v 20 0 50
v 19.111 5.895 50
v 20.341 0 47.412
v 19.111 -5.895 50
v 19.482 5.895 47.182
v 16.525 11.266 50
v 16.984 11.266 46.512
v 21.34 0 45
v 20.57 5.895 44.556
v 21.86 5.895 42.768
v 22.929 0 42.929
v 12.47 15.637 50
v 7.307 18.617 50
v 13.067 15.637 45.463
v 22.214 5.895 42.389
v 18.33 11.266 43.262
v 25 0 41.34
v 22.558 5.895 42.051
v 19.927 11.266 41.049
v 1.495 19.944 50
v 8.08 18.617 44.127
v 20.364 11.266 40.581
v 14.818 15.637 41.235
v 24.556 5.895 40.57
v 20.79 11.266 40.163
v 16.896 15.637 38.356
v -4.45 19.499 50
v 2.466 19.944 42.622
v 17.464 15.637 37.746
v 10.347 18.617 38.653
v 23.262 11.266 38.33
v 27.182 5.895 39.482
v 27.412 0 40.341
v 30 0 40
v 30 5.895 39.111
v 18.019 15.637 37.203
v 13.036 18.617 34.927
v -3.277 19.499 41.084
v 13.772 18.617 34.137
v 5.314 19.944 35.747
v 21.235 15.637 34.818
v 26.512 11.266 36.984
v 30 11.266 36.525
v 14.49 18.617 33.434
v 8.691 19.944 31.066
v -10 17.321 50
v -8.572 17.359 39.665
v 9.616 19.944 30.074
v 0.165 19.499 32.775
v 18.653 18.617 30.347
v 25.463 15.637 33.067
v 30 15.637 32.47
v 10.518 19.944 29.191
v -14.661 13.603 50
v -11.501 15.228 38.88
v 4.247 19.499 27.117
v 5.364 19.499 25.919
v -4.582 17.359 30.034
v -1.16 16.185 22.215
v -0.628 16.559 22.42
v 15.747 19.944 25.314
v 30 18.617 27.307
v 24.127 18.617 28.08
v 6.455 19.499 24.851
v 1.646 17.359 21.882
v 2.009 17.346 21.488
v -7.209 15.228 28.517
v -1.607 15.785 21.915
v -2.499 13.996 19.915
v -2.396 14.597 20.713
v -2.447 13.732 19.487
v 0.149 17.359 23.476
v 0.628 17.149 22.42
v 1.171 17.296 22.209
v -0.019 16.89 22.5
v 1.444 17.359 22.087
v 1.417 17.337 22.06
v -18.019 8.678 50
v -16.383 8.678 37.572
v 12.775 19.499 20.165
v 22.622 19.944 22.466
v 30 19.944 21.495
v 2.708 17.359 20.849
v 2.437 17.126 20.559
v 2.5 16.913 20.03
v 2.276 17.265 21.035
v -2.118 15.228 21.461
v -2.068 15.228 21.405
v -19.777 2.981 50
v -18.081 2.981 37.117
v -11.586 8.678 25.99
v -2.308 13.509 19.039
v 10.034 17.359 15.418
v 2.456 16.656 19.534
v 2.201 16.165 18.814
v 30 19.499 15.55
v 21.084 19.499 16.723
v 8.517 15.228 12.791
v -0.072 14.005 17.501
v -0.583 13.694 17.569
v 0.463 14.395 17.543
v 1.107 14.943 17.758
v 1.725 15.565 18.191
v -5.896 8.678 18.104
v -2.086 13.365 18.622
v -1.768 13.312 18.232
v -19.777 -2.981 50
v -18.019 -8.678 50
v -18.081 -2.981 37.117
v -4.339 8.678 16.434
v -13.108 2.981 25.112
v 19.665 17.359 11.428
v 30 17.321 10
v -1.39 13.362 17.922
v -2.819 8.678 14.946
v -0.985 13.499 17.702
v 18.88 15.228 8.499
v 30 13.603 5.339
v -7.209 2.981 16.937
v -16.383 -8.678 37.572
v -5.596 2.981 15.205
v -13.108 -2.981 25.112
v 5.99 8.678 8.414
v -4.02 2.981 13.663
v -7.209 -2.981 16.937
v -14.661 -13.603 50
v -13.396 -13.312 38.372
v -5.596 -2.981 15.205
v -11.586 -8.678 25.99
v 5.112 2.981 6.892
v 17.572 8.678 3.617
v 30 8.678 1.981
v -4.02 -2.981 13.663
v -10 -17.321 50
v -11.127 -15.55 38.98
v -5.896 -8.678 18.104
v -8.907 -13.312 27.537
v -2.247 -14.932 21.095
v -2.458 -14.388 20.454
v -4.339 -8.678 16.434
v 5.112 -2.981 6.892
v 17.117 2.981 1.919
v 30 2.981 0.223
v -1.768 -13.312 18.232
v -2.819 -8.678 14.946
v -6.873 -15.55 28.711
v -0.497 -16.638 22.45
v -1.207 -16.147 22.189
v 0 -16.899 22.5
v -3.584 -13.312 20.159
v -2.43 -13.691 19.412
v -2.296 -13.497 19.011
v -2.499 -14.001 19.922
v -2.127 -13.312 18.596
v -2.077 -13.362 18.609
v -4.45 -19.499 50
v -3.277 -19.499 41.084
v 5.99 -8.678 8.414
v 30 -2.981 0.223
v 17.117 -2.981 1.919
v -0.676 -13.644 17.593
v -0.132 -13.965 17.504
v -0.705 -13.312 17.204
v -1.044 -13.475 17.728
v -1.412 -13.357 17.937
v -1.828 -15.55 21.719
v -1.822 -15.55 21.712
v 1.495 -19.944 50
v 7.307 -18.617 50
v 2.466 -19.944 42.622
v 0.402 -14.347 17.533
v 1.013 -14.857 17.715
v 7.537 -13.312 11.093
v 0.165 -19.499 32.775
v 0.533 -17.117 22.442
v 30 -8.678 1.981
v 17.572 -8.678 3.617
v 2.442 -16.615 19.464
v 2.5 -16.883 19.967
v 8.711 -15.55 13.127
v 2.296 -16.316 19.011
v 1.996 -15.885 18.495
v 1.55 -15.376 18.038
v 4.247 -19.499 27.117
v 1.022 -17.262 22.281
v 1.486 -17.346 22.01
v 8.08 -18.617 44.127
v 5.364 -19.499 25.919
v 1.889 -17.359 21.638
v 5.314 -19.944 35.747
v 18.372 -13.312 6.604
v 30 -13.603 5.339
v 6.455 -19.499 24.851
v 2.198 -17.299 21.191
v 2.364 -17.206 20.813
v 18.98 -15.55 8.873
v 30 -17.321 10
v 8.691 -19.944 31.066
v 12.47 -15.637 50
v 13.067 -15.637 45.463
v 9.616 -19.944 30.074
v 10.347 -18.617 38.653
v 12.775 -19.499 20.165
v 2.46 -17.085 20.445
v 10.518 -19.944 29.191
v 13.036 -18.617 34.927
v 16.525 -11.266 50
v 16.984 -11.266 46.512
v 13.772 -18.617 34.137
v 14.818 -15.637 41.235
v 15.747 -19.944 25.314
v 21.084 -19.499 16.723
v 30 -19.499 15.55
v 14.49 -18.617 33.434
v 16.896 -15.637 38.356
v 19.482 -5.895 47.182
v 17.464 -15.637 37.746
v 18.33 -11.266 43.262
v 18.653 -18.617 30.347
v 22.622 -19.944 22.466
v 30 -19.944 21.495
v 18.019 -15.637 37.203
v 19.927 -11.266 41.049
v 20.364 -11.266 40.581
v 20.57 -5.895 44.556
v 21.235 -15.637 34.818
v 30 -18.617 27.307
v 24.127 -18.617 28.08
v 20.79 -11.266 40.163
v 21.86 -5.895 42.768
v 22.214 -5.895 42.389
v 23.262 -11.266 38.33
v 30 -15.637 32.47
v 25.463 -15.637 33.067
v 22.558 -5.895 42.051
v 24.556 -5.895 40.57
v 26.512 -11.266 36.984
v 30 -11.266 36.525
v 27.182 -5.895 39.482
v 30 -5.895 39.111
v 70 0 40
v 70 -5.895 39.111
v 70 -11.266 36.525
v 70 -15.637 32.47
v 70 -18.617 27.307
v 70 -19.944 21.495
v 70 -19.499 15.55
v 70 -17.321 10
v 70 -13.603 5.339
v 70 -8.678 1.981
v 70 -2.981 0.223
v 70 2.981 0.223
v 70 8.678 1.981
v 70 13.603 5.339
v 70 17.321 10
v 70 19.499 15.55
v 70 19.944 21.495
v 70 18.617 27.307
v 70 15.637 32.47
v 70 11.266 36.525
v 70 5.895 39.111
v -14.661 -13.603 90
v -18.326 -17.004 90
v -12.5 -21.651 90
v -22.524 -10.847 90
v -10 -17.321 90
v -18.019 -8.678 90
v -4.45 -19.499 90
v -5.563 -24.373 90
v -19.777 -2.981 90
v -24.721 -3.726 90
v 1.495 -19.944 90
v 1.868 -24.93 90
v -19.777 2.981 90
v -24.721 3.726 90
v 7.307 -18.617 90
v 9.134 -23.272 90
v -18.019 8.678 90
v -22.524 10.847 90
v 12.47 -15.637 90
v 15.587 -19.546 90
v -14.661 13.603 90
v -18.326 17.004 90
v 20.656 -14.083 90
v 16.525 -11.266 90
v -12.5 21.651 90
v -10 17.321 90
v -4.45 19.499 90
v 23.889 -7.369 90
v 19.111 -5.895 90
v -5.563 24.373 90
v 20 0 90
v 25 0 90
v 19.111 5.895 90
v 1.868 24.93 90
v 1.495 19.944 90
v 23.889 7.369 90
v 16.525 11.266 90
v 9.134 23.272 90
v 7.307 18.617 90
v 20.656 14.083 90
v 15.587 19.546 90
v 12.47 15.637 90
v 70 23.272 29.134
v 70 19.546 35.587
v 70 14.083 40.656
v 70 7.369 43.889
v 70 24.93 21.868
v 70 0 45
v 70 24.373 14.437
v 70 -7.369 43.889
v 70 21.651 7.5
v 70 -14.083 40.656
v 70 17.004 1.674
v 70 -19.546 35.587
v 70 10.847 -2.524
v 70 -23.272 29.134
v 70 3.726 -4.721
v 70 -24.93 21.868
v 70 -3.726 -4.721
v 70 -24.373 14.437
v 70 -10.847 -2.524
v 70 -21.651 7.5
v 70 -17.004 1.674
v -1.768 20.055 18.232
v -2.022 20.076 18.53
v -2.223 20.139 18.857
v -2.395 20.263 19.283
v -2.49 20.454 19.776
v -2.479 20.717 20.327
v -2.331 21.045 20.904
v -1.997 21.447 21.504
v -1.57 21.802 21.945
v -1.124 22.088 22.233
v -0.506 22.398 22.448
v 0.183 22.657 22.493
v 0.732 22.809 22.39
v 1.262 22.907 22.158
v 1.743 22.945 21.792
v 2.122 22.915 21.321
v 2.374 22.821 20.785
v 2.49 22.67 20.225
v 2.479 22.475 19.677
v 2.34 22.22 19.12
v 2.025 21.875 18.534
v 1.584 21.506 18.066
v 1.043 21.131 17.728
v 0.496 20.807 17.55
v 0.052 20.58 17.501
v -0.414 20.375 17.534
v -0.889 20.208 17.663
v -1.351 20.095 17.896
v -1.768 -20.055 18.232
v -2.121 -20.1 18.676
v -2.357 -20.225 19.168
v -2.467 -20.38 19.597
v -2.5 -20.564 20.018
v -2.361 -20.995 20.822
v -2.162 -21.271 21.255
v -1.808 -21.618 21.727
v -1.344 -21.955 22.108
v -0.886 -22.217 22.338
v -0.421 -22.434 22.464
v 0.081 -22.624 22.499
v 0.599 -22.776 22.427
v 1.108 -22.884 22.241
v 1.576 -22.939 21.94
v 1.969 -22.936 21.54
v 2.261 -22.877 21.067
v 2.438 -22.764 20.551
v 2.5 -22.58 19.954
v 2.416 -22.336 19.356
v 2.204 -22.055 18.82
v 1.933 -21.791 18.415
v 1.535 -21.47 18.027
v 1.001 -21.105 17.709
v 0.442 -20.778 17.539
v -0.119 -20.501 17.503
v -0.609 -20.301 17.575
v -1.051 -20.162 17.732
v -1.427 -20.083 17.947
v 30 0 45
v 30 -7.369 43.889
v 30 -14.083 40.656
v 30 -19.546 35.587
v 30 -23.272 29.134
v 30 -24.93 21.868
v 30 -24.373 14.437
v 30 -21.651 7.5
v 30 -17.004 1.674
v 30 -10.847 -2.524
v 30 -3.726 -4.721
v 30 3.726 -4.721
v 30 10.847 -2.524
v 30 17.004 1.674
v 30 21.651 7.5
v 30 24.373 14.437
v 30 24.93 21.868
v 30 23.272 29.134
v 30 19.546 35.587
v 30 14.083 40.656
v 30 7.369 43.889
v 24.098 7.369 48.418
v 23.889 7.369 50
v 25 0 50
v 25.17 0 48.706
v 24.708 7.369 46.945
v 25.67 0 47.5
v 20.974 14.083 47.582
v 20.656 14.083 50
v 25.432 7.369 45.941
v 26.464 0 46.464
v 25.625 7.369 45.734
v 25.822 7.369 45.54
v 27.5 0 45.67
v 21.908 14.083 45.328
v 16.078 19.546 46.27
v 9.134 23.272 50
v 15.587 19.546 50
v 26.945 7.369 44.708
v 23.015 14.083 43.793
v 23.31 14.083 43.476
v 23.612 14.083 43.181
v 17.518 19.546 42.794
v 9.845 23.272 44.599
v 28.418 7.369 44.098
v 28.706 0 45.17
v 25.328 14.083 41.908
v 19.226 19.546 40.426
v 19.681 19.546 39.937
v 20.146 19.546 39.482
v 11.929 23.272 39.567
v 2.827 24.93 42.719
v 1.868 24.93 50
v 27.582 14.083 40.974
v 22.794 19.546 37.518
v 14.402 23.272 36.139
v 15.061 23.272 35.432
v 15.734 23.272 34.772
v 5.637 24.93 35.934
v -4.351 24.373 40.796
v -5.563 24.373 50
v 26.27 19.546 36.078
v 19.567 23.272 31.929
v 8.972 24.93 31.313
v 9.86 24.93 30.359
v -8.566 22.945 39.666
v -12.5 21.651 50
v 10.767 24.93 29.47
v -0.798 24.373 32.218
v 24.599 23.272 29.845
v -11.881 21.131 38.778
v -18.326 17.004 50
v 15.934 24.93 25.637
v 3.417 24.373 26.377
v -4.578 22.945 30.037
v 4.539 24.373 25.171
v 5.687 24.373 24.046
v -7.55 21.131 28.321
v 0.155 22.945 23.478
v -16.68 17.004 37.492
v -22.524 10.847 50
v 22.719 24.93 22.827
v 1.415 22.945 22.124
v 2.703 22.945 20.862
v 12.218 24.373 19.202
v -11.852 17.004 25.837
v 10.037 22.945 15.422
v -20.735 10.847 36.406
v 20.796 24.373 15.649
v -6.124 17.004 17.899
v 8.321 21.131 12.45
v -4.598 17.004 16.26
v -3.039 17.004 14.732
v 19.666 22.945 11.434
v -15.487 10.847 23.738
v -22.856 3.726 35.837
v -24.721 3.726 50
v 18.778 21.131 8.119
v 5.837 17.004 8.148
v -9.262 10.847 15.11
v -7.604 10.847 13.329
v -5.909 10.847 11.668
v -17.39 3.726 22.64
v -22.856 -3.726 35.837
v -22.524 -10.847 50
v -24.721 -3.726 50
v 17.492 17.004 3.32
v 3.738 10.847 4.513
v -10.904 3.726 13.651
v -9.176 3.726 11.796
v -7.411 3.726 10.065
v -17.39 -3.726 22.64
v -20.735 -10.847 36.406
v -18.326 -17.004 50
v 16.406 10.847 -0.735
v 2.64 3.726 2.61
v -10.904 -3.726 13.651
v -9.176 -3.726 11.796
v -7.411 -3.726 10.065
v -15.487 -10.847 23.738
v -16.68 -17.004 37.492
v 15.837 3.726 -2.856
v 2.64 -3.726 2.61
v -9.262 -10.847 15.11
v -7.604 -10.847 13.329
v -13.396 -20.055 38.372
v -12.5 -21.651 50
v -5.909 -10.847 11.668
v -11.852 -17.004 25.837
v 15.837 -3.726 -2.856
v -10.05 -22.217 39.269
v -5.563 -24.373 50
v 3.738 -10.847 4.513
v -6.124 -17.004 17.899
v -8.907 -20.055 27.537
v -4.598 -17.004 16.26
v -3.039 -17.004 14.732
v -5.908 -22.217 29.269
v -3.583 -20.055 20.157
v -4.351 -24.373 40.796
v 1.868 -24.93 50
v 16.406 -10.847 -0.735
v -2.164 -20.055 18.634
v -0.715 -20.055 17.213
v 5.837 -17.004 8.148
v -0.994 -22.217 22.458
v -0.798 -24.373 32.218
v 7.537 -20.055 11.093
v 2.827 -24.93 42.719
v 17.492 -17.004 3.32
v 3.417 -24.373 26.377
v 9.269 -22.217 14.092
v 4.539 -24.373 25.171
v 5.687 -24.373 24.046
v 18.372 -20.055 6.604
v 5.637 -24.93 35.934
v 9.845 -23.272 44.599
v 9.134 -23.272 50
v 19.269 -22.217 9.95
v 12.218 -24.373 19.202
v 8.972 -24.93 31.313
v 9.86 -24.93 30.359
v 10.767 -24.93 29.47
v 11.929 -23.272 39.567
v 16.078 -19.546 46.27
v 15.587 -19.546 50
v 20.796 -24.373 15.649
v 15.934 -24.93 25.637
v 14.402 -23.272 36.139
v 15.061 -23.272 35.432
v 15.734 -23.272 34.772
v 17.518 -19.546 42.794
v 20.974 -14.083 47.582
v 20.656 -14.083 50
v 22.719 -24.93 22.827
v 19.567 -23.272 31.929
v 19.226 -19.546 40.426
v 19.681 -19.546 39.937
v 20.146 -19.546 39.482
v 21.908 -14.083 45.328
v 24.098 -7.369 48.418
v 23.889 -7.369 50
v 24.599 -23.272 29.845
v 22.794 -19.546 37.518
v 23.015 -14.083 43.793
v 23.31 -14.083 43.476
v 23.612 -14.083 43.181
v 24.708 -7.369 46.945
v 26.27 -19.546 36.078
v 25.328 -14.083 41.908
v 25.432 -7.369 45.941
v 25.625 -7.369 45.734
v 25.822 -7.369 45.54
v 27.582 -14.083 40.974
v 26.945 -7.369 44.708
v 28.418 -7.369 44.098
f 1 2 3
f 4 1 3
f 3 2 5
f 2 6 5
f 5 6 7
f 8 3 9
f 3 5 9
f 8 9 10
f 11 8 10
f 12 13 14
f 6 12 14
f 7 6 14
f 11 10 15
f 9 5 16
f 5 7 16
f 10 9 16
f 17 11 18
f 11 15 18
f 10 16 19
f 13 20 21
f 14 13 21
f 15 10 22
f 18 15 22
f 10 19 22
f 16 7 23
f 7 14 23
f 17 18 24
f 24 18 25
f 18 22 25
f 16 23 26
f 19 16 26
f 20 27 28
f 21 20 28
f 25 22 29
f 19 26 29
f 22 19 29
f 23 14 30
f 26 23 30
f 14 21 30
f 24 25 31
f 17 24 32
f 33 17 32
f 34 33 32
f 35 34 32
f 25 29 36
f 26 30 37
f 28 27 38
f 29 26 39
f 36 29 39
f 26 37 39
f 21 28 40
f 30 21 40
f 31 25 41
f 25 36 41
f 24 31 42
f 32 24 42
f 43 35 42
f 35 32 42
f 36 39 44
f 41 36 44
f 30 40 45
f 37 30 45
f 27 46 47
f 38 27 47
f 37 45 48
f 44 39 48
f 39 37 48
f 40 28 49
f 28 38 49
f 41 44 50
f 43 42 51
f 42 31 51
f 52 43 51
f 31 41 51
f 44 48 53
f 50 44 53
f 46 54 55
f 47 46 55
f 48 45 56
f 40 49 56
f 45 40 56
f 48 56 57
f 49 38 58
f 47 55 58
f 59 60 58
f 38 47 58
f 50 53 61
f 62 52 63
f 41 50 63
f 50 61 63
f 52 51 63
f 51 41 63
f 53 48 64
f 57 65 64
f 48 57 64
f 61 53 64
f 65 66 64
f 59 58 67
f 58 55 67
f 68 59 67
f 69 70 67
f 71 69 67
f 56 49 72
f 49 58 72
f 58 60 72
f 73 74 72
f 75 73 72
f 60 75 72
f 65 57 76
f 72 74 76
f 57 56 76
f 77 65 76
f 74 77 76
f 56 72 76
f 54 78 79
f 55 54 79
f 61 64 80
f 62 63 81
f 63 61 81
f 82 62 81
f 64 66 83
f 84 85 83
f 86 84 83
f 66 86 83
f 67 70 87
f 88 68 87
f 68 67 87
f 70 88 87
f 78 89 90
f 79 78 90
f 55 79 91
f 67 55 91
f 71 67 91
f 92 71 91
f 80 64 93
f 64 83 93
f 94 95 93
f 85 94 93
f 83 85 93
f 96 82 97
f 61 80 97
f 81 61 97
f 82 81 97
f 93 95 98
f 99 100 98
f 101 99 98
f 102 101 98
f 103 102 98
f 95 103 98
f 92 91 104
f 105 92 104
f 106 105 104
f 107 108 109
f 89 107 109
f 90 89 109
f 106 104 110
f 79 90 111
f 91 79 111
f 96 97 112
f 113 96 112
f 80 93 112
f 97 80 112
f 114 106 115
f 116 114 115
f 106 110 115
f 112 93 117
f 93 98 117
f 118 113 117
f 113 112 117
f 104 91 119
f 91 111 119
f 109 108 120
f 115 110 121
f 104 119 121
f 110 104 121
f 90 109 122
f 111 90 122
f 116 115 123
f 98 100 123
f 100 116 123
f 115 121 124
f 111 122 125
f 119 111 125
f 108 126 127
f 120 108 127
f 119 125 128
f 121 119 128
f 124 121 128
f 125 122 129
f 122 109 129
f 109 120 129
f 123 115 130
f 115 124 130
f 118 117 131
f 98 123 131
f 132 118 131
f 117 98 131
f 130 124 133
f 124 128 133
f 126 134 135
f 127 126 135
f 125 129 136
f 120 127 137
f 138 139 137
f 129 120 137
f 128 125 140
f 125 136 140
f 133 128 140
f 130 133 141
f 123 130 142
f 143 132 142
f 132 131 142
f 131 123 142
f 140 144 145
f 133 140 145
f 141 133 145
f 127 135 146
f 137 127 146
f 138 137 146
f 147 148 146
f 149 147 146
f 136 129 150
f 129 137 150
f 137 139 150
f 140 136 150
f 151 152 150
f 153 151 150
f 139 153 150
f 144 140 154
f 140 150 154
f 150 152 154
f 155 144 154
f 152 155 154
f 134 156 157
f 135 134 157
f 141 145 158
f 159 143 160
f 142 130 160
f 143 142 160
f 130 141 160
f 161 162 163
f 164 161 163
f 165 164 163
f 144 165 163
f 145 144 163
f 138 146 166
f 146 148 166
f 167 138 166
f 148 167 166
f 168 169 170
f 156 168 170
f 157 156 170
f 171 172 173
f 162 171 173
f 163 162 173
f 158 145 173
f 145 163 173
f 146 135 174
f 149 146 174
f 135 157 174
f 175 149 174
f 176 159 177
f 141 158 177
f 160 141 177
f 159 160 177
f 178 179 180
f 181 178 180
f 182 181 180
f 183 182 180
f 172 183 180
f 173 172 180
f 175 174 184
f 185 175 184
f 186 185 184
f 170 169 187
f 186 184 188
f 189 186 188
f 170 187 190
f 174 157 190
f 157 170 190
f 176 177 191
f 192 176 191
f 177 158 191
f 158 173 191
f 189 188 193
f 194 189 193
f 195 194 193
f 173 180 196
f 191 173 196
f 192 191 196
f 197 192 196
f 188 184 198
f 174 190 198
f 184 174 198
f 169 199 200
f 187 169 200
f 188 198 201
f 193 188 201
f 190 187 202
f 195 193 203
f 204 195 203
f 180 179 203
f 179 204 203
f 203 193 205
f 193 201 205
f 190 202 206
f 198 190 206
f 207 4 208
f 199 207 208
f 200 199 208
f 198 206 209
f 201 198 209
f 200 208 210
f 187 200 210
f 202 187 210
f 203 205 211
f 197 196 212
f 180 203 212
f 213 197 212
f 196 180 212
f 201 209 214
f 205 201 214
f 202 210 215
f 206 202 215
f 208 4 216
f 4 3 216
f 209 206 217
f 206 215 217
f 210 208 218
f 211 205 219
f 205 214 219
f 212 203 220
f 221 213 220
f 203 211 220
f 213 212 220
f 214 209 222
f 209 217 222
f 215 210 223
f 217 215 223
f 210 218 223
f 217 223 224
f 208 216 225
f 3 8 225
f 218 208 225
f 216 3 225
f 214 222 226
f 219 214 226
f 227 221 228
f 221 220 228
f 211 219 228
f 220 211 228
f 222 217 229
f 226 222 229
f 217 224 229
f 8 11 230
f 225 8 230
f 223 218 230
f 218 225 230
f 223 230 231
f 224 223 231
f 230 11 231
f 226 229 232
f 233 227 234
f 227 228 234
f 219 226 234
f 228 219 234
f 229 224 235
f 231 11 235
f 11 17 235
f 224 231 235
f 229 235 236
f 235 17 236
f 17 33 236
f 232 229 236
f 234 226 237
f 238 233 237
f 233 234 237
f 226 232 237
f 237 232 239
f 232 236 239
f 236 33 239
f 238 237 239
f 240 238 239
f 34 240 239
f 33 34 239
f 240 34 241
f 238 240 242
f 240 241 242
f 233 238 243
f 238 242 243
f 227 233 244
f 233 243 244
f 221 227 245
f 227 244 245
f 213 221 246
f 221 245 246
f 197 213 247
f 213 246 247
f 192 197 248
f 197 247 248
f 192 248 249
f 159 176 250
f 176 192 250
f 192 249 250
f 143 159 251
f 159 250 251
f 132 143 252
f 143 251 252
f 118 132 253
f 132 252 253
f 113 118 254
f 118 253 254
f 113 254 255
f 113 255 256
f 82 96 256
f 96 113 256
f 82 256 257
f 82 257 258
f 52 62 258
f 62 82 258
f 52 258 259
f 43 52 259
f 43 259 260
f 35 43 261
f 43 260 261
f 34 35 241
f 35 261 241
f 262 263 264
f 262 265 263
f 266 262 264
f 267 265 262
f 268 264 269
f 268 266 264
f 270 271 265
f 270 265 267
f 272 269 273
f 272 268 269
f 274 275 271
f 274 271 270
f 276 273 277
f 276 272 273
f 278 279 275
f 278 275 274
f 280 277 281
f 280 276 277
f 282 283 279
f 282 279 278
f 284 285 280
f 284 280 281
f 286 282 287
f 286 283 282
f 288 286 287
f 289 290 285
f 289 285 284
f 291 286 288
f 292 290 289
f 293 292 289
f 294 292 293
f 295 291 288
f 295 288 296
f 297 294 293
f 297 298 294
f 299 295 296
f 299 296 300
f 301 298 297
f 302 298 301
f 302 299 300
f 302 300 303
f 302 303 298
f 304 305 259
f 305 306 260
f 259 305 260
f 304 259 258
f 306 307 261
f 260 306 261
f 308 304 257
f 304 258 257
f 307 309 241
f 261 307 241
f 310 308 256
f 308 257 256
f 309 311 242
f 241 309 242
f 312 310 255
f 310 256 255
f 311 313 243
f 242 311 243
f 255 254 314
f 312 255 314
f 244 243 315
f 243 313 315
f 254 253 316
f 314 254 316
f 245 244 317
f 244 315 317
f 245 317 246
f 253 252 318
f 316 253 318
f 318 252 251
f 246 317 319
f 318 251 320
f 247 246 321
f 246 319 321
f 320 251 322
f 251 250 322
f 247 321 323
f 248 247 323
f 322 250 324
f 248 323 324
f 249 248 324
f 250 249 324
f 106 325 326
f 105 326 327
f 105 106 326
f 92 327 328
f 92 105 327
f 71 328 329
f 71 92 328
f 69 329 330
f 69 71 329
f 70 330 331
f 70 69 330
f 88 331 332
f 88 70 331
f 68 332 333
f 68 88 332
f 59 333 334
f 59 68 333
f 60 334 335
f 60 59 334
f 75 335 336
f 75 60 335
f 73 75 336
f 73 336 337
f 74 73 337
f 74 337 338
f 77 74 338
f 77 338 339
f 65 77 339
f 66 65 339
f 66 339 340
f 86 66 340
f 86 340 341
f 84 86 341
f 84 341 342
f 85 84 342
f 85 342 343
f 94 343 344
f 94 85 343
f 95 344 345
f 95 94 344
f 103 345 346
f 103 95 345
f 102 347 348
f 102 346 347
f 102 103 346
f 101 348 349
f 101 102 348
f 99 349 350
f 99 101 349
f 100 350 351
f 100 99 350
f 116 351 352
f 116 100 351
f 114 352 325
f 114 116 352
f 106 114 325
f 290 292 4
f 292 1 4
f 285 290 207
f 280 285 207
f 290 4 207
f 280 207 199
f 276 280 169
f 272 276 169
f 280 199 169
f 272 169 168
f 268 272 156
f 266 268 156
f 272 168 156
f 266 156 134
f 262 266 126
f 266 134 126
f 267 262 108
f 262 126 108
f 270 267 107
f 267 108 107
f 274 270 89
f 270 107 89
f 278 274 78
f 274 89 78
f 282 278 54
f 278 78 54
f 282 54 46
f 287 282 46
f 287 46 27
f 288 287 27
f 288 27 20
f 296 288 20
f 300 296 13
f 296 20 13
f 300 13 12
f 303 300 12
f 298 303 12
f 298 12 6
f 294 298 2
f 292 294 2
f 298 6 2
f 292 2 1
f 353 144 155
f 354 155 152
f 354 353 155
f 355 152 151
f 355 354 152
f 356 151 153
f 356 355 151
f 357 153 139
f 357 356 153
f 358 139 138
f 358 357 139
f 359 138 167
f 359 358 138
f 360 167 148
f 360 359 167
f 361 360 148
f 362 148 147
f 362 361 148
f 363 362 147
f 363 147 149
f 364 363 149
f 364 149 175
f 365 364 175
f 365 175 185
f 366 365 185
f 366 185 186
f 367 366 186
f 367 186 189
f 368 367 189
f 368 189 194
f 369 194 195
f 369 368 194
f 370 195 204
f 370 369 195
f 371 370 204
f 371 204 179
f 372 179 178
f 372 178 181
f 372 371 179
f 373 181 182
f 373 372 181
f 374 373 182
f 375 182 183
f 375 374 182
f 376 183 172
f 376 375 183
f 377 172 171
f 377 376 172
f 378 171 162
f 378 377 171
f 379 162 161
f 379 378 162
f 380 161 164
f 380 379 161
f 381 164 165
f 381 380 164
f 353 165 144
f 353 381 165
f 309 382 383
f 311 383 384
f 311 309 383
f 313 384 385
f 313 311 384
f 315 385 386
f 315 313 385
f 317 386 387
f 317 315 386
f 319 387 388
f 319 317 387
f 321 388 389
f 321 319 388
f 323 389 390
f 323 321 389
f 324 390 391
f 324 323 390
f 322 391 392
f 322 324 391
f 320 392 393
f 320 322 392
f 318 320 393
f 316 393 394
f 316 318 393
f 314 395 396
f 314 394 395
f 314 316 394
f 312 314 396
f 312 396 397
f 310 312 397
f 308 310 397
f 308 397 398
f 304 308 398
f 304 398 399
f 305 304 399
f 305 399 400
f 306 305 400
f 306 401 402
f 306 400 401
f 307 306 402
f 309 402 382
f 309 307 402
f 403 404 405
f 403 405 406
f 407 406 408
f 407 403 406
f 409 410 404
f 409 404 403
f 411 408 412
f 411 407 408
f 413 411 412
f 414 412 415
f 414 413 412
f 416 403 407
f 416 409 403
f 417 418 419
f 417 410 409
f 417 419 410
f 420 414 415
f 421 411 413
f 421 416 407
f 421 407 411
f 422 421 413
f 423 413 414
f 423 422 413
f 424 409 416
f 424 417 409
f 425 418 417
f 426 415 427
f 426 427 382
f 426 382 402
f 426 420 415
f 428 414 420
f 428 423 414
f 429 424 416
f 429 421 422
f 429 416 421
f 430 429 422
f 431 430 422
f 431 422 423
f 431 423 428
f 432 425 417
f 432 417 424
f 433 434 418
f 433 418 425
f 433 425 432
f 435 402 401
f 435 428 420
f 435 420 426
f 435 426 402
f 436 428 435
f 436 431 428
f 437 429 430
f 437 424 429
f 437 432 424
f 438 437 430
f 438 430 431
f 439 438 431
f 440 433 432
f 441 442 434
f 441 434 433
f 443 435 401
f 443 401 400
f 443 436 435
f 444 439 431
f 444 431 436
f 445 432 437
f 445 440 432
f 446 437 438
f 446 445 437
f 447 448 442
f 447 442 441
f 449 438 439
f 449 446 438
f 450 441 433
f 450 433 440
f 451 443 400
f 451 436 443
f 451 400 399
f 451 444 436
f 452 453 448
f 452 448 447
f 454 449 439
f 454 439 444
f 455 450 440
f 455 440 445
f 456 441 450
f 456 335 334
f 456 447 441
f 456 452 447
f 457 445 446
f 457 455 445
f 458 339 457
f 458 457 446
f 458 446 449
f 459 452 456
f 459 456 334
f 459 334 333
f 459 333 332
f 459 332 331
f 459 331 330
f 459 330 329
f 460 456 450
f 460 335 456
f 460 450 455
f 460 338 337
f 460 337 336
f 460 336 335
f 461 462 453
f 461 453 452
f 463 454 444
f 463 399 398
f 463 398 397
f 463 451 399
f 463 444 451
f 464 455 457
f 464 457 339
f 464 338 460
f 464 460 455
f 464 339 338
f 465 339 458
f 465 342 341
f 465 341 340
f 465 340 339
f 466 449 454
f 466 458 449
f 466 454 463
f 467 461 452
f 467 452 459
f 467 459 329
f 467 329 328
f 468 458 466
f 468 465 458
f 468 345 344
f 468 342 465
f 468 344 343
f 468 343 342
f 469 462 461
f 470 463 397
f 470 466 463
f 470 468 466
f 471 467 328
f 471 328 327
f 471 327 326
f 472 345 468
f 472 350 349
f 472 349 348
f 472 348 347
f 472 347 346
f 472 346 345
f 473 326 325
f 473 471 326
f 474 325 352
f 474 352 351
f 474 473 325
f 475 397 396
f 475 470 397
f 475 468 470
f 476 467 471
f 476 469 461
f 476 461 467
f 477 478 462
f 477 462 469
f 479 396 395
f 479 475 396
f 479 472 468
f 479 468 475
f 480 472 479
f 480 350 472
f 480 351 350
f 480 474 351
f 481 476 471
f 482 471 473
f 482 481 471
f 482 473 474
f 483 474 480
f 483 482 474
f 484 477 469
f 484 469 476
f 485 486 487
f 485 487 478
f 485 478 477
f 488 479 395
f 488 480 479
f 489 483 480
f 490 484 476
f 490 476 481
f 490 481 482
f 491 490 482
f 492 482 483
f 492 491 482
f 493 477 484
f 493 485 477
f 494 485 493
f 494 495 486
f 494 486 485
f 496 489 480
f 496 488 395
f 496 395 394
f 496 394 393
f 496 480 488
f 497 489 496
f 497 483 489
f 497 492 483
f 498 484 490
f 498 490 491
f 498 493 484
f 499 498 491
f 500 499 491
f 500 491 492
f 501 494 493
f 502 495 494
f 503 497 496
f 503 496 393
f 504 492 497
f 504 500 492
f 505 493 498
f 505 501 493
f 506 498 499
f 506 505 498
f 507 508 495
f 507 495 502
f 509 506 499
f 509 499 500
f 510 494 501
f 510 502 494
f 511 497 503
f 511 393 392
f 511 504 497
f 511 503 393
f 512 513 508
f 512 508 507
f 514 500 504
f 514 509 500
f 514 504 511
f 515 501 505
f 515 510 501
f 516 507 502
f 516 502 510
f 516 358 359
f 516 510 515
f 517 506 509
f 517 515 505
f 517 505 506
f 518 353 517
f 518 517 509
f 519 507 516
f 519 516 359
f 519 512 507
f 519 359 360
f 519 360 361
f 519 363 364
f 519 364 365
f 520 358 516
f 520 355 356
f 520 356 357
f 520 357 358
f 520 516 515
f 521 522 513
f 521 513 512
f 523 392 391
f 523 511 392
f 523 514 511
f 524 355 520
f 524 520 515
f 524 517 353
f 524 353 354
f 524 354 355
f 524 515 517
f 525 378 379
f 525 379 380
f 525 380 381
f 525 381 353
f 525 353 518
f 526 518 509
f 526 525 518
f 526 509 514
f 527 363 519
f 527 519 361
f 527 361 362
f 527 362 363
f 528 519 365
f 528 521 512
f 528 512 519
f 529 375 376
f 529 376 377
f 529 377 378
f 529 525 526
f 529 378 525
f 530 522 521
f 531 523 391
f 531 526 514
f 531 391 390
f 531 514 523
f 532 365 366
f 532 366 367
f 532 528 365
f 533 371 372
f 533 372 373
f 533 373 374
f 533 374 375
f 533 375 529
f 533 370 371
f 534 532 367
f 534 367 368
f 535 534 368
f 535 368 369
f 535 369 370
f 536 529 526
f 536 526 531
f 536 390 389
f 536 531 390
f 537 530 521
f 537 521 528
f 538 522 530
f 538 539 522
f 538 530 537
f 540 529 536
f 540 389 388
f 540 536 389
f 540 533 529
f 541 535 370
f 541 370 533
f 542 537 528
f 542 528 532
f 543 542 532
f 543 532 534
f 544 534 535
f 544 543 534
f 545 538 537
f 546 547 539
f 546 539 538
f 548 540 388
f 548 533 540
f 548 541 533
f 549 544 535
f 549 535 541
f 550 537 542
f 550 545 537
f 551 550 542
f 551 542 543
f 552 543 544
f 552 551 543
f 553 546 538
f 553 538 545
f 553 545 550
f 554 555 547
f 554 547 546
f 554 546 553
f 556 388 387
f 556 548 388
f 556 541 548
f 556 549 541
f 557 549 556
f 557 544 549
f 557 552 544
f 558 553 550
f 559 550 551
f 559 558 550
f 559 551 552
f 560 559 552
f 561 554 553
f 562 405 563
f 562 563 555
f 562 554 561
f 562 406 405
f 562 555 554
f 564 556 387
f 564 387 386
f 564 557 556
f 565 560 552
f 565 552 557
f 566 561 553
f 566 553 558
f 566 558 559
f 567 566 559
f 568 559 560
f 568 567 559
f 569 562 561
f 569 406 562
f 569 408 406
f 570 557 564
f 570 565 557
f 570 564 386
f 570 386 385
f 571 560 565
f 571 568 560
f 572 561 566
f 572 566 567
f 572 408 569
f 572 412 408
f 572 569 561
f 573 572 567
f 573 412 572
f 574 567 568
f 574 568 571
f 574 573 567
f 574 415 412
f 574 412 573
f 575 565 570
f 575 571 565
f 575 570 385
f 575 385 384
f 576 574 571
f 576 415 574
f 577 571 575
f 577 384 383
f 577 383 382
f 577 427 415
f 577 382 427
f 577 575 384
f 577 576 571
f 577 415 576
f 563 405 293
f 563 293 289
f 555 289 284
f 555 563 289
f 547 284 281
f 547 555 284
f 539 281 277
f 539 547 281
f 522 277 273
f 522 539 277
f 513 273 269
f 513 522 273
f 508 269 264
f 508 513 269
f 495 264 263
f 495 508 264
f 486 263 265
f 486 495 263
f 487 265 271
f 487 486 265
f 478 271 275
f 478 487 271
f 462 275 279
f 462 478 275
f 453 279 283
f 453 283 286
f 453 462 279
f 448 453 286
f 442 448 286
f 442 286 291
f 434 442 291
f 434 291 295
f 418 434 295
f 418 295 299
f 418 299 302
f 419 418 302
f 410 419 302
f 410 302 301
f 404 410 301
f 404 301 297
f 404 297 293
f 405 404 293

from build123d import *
from build123d.topology import SkipClean

# Parameters (mm, degrees)
SKETCH2_R               = 25
SHELL3_T                = -5
CUT_EXTRUDE2_DEPTH      = 117.726175321
CUT_EXTRUDE2_DEPTH_BACK = 96
SKETCH3_R               = 2.5


with BuildPart() as part:
    # Sweep7: sweep along a path in Sketch1
    with BuildLine(Plane(origin=(0, 0, 0), x_dir=(1, 0, 0), z_dir=(0, 1, 0))) as sweep7_path:
        Line((0, -90), (0, -50))
        ThreePointArc((0, -50), (8.786796564, -28.786796564), (30, -20))
        Line((30, -20), (70, -20))
    # Sketch2 → Sweep7 (sweep)
    with BuildSketch(Plane.XY.offset(90)):
        Circle(SKETCH2_R)
    sweep(path=sweep7_path.line)

    # Shell3
    shell3_openings = [part.faces().sort_by_distance(p)[0] for p in [
        (70, 0, 20),
        (0, 0, 90),
    ]]
    offset(amount=SHELL3_T, openings=shell3_openings, kind=Kind.INTERSECTION)

    # Sketch3 → Cut-Extrude2 (cut, two sides: drawn at the far end of the back side and taken through both)
    with SkipClean():  # the faces are left unmerged after this step: merging them gives an invalid solid
        with BuildSketch(Plane(origin=(0, 0, 0), x_dir=(1, 0, 0), z_dir=(0, 1, 0)).offset(-CUT_EXTRUDE2_DEPTH_BACK)):
            with Locations((0, -20)):
                Circle(SKETCH3_R)
        extrude(amount=CUT_EXTRUDE2_DEPTH + CUT_EXTRUDE2_DEPTH_BACK, mode=Mode.SUBTRACT)


solid = part.part
